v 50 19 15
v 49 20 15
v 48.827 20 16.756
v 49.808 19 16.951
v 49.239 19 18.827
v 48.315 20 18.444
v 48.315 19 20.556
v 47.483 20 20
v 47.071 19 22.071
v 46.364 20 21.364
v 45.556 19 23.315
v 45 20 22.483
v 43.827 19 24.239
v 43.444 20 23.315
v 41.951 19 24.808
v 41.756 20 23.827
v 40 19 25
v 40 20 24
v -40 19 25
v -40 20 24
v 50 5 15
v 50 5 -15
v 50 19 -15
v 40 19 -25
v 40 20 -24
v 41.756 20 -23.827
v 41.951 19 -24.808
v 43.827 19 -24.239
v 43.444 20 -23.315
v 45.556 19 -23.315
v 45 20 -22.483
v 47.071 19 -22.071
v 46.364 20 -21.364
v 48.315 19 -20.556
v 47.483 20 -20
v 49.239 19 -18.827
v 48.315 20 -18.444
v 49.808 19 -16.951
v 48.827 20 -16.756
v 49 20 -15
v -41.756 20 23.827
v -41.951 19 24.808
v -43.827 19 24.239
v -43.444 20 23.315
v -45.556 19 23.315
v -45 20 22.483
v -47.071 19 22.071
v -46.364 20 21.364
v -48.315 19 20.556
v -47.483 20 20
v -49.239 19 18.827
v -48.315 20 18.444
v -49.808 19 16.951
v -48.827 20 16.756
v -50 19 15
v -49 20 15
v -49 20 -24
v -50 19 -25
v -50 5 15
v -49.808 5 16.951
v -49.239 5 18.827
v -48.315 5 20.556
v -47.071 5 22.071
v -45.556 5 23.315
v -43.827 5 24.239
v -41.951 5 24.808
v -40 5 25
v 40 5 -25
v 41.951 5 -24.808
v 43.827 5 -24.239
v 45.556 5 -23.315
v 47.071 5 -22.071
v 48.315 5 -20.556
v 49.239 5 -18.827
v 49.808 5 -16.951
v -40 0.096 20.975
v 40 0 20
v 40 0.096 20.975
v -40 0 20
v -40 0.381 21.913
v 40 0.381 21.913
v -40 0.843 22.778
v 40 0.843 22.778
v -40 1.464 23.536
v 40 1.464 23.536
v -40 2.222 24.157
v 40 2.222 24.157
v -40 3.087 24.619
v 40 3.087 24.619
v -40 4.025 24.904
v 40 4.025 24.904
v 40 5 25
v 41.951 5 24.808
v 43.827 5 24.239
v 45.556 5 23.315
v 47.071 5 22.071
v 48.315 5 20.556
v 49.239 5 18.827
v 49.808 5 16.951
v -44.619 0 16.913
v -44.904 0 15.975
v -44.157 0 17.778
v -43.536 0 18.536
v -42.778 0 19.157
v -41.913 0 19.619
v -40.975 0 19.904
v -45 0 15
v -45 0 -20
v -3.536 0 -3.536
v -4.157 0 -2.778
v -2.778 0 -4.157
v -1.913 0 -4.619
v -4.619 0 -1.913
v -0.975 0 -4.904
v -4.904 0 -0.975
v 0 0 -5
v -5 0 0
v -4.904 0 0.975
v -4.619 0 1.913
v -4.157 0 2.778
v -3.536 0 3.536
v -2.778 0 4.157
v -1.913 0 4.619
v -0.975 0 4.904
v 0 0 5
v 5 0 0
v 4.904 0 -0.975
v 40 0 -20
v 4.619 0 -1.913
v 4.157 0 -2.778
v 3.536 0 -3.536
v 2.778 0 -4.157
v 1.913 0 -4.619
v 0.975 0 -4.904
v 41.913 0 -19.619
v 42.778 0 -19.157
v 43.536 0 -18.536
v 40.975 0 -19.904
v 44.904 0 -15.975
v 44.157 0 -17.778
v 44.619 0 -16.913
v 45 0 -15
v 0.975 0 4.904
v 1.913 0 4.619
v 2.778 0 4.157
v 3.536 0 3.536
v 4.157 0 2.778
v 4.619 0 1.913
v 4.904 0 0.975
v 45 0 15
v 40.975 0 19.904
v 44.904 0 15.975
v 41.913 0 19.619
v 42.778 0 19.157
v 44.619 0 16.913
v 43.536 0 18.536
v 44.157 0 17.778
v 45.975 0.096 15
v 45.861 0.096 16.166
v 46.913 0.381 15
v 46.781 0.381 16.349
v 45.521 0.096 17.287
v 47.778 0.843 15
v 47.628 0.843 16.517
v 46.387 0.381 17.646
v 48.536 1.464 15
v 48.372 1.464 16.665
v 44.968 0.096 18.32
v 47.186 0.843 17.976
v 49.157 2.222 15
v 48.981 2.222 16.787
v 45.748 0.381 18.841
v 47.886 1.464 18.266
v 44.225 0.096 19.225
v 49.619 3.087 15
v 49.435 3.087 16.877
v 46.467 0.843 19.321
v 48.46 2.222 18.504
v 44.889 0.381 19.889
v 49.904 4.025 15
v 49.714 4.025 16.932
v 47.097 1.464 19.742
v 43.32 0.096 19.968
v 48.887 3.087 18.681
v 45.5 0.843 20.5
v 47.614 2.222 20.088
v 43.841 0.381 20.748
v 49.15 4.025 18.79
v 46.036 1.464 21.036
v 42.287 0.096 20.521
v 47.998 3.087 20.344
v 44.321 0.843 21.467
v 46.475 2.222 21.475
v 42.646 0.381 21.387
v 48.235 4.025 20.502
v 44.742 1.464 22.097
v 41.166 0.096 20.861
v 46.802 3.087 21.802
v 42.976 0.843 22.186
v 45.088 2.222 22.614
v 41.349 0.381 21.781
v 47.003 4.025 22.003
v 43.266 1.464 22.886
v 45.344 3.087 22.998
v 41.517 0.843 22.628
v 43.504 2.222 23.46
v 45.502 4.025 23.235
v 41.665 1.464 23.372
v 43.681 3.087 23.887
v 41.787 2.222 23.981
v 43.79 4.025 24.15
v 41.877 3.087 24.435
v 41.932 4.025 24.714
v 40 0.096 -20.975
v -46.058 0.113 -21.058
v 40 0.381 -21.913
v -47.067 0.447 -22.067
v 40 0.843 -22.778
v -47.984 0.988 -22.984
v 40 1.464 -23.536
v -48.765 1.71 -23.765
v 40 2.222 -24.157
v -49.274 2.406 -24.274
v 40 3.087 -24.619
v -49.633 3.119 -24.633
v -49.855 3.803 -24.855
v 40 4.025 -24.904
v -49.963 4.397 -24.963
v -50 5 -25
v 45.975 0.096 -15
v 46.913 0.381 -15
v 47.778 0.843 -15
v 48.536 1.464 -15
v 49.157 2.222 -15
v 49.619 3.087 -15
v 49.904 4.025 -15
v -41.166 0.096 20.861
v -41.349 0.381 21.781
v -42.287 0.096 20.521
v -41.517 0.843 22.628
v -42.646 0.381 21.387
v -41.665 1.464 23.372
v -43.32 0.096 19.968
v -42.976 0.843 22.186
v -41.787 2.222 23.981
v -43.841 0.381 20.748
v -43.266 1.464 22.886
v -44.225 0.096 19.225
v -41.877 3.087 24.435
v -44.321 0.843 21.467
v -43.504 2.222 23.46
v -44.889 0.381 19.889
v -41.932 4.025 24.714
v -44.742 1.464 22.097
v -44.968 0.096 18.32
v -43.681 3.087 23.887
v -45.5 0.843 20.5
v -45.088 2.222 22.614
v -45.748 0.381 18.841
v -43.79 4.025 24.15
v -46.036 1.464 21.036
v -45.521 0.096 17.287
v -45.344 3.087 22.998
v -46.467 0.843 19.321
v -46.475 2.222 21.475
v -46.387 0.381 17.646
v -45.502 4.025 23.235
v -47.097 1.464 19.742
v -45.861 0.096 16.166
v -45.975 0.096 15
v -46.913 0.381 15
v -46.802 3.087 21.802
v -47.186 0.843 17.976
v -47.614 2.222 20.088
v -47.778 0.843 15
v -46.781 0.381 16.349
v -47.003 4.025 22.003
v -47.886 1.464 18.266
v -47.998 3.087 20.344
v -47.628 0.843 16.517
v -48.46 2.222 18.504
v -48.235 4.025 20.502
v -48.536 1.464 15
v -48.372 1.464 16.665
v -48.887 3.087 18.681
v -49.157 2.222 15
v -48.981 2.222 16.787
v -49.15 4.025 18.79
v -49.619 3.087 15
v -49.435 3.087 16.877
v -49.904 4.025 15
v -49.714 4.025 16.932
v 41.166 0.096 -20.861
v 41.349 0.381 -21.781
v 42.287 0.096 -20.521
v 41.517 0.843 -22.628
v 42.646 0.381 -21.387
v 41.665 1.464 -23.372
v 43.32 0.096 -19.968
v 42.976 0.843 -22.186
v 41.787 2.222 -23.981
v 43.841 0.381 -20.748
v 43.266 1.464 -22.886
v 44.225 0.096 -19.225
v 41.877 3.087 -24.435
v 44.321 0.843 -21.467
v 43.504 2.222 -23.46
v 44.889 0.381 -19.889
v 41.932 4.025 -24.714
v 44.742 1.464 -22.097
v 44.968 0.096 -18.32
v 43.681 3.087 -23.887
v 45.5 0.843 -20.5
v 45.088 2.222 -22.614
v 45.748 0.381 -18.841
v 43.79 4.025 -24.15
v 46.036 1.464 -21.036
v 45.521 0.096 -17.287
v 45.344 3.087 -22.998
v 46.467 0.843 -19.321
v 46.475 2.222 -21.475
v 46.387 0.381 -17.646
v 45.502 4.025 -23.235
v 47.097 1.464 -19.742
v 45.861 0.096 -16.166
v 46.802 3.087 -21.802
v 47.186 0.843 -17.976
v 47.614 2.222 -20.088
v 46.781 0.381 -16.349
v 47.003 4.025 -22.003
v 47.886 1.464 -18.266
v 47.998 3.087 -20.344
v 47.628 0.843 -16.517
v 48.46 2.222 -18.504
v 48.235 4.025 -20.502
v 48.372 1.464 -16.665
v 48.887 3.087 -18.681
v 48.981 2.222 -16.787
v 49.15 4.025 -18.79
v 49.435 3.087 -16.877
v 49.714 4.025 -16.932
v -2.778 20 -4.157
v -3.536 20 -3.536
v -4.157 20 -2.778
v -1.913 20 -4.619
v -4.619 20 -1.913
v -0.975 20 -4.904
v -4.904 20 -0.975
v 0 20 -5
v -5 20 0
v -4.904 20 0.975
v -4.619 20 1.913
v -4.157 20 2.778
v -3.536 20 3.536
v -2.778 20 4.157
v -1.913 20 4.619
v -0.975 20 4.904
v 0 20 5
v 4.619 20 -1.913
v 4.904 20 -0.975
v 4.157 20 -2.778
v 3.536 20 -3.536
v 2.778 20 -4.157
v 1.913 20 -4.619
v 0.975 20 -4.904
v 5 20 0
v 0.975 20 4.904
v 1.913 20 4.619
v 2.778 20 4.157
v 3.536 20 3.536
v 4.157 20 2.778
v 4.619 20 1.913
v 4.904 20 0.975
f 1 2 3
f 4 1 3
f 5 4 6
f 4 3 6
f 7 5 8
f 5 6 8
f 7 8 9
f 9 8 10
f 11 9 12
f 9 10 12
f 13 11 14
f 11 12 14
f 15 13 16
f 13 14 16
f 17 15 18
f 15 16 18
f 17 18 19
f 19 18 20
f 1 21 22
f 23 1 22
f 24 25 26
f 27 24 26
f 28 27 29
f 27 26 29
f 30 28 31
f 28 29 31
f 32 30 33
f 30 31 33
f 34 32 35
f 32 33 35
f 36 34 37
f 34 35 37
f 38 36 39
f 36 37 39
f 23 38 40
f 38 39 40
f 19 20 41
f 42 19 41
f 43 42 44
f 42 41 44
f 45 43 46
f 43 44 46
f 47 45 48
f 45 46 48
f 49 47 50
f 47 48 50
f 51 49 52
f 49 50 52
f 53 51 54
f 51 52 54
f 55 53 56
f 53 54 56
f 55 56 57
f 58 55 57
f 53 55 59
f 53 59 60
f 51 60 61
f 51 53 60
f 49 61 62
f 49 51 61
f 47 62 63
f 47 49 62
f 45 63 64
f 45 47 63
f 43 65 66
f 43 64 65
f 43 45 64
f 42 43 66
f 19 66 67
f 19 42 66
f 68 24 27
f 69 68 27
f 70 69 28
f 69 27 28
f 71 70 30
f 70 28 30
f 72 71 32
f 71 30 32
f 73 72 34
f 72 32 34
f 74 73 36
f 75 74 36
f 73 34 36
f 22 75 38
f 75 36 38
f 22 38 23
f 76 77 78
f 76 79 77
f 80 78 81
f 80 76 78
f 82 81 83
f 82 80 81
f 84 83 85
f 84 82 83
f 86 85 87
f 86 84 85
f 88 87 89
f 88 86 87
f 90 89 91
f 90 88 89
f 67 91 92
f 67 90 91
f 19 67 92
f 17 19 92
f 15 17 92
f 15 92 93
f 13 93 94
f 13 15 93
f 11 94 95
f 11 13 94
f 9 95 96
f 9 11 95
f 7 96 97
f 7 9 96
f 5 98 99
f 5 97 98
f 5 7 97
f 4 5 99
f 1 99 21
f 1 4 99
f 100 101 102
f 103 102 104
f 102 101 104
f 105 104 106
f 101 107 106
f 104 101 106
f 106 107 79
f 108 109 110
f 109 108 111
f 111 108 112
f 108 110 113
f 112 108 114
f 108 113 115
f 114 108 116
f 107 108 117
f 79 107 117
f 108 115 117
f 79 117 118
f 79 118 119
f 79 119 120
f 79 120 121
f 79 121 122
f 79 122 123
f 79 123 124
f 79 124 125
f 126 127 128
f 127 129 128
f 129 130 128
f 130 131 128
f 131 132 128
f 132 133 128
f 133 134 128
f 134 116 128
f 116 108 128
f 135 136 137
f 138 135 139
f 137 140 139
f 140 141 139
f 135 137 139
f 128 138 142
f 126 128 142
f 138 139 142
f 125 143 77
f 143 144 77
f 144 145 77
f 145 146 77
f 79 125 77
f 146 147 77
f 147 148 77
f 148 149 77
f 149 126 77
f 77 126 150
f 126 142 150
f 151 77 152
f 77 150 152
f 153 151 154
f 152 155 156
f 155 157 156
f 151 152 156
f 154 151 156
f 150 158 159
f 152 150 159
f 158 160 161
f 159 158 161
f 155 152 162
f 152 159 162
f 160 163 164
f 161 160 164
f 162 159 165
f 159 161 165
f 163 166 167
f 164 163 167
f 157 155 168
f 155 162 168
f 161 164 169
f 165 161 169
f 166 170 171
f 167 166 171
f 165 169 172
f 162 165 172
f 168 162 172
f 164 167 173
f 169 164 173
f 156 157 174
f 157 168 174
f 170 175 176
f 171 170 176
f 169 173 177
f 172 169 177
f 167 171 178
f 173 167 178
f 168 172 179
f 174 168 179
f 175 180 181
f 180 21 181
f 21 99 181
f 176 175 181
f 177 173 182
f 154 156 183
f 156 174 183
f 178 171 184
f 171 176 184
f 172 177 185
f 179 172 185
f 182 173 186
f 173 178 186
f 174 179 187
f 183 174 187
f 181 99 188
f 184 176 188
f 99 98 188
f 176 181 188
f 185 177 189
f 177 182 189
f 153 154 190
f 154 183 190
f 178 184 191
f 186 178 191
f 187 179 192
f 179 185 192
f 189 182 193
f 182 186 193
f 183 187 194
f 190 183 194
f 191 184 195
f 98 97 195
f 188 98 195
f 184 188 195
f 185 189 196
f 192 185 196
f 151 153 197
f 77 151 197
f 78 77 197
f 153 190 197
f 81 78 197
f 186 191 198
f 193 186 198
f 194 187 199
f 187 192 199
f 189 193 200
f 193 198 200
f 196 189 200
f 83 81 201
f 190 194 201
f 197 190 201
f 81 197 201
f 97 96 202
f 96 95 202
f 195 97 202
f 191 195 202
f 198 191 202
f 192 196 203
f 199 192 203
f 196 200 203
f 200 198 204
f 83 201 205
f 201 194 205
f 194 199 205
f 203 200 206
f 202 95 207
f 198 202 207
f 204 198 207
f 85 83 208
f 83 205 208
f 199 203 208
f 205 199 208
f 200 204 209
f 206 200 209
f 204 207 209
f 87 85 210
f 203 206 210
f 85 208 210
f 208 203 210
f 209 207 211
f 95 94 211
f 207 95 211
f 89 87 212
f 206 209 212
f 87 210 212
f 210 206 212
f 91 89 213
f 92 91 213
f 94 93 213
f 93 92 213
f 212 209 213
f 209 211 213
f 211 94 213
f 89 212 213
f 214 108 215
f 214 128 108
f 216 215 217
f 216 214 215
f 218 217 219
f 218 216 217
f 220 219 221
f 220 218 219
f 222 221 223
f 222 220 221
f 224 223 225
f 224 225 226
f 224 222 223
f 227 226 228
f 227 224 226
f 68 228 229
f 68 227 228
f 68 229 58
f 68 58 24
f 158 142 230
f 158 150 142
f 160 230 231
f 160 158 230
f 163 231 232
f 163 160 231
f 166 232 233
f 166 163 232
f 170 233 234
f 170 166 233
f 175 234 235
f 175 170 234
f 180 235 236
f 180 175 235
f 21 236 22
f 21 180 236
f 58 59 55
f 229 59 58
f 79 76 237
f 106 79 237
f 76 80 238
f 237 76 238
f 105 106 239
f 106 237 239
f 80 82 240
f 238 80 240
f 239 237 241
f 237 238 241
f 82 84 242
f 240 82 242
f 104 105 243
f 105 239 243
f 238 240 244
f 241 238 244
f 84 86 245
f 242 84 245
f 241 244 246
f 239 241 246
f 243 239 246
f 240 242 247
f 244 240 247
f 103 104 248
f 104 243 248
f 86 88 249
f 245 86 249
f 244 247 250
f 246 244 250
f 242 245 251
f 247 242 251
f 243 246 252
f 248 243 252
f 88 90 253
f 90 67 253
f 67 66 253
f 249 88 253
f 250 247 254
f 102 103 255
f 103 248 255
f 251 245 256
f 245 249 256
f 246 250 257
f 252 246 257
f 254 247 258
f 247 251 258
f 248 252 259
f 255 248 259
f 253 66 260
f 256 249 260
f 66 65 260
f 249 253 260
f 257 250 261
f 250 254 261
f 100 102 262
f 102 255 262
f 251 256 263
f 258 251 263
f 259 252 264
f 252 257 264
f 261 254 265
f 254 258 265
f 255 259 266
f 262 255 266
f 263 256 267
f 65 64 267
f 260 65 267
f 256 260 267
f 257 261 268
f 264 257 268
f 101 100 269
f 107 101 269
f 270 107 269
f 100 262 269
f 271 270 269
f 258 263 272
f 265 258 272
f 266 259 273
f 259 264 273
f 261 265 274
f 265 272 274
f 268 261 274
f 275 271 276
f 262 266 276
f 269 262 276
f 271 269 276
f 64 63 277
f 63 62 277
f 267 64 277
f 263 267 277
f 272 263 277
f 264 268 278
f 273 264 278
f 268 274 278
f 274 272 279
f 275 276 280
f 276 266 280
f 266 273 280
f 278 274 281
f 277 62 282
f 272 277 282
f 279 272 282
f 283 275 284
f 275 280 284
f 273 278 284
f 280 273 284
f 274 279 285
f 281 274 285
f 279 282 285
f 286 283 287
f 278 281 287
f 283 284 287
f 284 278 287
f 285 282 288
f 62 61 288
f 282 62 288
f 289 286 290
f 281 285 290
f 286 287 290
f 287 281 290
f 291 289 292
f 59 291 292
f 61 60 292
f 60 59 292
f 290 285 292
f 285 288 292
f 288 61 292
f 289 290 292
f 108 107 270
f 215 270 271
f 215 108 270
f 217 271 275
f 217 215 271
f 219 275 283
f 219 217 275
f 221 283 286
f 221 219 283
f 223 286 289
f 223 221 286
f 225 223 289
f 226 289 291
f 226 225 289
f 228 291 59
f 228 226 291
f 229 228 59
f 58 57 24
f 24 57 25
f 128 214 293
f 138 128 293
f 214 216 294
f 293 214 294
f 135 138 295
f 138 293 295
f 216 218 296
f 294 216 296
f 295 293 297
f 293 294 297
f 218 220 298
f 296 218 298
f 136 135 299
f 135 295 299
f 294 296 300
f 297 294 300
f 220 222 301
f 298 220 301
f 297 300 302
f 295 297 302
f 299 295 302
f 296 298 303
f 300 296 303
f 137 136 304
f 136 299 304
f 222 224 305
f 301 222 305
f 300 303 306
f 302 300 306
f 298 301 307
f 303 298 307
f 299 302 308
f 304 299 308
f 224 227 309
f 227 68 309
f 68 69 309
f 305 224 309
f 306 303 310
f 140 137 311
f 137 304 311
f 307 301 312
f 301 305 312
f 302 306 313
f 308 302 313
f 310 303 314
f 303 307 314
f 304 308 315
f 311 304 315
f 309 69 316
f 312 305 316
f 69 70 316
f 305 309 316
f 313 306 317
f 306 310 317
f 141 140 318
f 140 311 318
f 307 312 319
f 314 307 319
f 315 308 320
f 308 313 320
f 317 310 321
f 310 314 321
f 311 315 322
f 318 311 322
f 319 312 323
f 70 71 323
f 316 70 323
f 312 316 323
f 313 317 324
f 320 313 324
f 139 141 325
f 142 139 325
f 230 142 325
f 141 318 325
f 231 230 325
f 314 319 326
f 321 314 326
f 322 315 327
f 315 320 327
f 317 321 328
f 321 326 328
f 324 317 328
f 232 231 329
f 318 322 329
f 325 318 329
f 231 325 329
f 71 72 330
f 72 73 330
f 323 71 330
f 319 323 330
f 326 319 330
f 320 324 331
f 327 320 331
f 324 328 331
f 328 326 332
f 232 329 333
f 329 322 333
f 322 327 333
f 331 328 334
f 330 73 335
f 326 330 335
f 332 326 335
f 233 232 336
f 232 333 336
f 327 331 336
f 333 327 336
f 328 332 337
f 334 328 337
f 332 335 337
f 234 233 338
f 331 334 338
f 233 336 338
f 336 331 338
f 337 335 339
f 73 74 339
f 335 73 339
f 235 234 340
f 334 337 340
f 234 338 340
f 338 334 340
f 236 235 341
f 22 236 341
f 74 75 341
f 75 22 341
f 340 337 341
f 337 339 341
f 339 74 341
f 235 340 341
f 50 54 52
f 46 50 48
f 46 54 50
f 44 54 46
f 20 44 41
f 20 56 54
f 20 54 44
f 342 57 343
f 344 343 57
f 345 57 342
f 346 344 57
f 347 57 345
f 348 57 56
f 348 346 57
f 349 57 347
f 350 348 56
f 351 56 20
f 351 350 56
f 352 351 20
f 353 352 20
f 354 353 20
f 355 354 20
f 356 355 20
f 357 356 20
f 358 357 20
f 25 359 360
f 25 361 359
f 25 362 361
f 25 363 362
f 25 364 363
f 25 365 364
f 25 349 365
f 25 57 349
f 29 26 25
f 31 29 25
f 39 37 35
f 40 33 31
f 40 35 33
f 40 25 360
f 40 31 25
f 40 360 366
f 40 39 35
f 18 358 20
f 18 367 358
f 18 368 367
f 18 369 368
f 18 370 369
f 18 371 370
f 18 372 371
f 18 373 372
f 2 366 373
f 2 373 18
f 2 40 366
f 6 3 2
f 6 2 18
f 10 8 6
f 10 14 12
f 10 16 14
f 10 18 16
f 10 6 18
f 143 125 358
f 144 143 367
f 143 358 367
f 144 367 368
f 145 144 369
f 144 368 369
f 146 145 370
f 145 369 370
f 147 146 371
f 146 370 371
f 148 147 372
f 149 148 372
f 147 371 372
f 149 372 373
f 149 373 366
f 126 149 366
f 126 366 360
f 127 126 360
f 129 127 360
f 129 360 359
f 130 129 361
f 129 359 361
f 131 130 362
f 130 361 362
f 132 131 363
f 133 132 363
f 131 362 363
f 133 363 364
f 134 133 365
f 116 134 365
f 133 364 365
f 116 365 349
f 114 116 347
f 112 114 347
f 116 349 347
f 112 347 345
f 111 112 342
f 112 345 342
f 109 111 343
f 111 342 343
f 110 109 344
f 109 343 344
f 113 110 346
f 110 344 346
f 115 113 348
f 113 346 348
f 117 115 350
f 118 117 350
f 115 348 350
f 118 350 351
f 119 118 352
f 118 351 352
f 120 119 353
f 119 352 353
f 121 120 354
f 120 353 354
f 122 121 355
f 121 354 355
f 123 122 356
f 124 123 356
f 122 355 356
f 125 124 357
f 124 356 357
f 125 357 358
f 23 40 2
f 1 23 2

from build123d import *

# Parameters (mm, degrees)
SKETCH1_W           = 100
SKETCH1_H           = 50
BOSS_EXTRUDE1_DEPTH = 20
SKETCH2_R           = 15
CUT_EXTRUDE1_DEPTH  = 20
FILLET1_R           = 10
CHAMFER1_SIZE       = 1
MOVE_FACE1_BY       = 10
FILLET2_R           = 5


with BuildPart() as part:
    # Sketch1 → Boss-Extrude1 (new body)
    with BuildSketch(Plane(origin=(0, 0, 0), x_dir=(1, 0, 0), z_dir=(0, 1, 0))):
        Rectangle(SKETCH1_W, SKETCH1_H)
    extrude(amount=BOSS_EXTRUDE1_DEPTH)

    # Sketch2 → Cut-Extrude1 (cut)
    with BuildSketch(Plane(origin=(0, 20, 0), x_dir=(1, 0, 0), z_dir=(0, 1, 0))):
        with Locations(Location((0, 0, 0), (0, 0, 270))):
            Circle(SKETCH2_R)
    extrude(amount=-CUT_EXTRUDE1_DEPTH, mode=Mode.SUBTRACT)

    # Fillet1
    fillet1_edges = [part.edges().sort_by_distance(p)[0] for p in [
        (50, 10, 25),
        (-50, 10, 25),
        (50, 10, -25),
    ]]
    fillet(fillet1_edges, radius=FILLET1_R)

    # Chamfer1
    chamfer1_edges = [part.edges().sort_by_distance(p)[0] for p in [
        (-50, 20, -5),
        (-5, 20, -25),
        (50, 20, 0),
        (0, 20, 25),
        (-47.071067812, 20, 22.071067812),
        (47.071067812, 20, 22.071067812),
        (47.071067812, 20, -22.071067812),
    ]]
    chamfer(chamfer1_edges, length=CHAMFER1_SIZE)

    # Move Face1: a curved face moved outward by 10.0
    add(Solid.thicken(part.faces().sort_by_distance((0, 10, -15))[0], MOVE_FACE1_BY))

    # Fillet2
    fillet2_edges = [part.edges().sort_by_distance(p)[0] for p in [
        (-5, 0, -25),
        (50, 0, 0),
        (0, 0, 25),
        (-47.071067812, 0, 22.071067812),
        (47.071067812, 0, 22.071067812),
        (47.071067812, 0, -22.071067812),
        (-50, 0, -5),
    ]]
    fillet(fillet2_edges, radius=FILLET2_R)


solid = part.part
